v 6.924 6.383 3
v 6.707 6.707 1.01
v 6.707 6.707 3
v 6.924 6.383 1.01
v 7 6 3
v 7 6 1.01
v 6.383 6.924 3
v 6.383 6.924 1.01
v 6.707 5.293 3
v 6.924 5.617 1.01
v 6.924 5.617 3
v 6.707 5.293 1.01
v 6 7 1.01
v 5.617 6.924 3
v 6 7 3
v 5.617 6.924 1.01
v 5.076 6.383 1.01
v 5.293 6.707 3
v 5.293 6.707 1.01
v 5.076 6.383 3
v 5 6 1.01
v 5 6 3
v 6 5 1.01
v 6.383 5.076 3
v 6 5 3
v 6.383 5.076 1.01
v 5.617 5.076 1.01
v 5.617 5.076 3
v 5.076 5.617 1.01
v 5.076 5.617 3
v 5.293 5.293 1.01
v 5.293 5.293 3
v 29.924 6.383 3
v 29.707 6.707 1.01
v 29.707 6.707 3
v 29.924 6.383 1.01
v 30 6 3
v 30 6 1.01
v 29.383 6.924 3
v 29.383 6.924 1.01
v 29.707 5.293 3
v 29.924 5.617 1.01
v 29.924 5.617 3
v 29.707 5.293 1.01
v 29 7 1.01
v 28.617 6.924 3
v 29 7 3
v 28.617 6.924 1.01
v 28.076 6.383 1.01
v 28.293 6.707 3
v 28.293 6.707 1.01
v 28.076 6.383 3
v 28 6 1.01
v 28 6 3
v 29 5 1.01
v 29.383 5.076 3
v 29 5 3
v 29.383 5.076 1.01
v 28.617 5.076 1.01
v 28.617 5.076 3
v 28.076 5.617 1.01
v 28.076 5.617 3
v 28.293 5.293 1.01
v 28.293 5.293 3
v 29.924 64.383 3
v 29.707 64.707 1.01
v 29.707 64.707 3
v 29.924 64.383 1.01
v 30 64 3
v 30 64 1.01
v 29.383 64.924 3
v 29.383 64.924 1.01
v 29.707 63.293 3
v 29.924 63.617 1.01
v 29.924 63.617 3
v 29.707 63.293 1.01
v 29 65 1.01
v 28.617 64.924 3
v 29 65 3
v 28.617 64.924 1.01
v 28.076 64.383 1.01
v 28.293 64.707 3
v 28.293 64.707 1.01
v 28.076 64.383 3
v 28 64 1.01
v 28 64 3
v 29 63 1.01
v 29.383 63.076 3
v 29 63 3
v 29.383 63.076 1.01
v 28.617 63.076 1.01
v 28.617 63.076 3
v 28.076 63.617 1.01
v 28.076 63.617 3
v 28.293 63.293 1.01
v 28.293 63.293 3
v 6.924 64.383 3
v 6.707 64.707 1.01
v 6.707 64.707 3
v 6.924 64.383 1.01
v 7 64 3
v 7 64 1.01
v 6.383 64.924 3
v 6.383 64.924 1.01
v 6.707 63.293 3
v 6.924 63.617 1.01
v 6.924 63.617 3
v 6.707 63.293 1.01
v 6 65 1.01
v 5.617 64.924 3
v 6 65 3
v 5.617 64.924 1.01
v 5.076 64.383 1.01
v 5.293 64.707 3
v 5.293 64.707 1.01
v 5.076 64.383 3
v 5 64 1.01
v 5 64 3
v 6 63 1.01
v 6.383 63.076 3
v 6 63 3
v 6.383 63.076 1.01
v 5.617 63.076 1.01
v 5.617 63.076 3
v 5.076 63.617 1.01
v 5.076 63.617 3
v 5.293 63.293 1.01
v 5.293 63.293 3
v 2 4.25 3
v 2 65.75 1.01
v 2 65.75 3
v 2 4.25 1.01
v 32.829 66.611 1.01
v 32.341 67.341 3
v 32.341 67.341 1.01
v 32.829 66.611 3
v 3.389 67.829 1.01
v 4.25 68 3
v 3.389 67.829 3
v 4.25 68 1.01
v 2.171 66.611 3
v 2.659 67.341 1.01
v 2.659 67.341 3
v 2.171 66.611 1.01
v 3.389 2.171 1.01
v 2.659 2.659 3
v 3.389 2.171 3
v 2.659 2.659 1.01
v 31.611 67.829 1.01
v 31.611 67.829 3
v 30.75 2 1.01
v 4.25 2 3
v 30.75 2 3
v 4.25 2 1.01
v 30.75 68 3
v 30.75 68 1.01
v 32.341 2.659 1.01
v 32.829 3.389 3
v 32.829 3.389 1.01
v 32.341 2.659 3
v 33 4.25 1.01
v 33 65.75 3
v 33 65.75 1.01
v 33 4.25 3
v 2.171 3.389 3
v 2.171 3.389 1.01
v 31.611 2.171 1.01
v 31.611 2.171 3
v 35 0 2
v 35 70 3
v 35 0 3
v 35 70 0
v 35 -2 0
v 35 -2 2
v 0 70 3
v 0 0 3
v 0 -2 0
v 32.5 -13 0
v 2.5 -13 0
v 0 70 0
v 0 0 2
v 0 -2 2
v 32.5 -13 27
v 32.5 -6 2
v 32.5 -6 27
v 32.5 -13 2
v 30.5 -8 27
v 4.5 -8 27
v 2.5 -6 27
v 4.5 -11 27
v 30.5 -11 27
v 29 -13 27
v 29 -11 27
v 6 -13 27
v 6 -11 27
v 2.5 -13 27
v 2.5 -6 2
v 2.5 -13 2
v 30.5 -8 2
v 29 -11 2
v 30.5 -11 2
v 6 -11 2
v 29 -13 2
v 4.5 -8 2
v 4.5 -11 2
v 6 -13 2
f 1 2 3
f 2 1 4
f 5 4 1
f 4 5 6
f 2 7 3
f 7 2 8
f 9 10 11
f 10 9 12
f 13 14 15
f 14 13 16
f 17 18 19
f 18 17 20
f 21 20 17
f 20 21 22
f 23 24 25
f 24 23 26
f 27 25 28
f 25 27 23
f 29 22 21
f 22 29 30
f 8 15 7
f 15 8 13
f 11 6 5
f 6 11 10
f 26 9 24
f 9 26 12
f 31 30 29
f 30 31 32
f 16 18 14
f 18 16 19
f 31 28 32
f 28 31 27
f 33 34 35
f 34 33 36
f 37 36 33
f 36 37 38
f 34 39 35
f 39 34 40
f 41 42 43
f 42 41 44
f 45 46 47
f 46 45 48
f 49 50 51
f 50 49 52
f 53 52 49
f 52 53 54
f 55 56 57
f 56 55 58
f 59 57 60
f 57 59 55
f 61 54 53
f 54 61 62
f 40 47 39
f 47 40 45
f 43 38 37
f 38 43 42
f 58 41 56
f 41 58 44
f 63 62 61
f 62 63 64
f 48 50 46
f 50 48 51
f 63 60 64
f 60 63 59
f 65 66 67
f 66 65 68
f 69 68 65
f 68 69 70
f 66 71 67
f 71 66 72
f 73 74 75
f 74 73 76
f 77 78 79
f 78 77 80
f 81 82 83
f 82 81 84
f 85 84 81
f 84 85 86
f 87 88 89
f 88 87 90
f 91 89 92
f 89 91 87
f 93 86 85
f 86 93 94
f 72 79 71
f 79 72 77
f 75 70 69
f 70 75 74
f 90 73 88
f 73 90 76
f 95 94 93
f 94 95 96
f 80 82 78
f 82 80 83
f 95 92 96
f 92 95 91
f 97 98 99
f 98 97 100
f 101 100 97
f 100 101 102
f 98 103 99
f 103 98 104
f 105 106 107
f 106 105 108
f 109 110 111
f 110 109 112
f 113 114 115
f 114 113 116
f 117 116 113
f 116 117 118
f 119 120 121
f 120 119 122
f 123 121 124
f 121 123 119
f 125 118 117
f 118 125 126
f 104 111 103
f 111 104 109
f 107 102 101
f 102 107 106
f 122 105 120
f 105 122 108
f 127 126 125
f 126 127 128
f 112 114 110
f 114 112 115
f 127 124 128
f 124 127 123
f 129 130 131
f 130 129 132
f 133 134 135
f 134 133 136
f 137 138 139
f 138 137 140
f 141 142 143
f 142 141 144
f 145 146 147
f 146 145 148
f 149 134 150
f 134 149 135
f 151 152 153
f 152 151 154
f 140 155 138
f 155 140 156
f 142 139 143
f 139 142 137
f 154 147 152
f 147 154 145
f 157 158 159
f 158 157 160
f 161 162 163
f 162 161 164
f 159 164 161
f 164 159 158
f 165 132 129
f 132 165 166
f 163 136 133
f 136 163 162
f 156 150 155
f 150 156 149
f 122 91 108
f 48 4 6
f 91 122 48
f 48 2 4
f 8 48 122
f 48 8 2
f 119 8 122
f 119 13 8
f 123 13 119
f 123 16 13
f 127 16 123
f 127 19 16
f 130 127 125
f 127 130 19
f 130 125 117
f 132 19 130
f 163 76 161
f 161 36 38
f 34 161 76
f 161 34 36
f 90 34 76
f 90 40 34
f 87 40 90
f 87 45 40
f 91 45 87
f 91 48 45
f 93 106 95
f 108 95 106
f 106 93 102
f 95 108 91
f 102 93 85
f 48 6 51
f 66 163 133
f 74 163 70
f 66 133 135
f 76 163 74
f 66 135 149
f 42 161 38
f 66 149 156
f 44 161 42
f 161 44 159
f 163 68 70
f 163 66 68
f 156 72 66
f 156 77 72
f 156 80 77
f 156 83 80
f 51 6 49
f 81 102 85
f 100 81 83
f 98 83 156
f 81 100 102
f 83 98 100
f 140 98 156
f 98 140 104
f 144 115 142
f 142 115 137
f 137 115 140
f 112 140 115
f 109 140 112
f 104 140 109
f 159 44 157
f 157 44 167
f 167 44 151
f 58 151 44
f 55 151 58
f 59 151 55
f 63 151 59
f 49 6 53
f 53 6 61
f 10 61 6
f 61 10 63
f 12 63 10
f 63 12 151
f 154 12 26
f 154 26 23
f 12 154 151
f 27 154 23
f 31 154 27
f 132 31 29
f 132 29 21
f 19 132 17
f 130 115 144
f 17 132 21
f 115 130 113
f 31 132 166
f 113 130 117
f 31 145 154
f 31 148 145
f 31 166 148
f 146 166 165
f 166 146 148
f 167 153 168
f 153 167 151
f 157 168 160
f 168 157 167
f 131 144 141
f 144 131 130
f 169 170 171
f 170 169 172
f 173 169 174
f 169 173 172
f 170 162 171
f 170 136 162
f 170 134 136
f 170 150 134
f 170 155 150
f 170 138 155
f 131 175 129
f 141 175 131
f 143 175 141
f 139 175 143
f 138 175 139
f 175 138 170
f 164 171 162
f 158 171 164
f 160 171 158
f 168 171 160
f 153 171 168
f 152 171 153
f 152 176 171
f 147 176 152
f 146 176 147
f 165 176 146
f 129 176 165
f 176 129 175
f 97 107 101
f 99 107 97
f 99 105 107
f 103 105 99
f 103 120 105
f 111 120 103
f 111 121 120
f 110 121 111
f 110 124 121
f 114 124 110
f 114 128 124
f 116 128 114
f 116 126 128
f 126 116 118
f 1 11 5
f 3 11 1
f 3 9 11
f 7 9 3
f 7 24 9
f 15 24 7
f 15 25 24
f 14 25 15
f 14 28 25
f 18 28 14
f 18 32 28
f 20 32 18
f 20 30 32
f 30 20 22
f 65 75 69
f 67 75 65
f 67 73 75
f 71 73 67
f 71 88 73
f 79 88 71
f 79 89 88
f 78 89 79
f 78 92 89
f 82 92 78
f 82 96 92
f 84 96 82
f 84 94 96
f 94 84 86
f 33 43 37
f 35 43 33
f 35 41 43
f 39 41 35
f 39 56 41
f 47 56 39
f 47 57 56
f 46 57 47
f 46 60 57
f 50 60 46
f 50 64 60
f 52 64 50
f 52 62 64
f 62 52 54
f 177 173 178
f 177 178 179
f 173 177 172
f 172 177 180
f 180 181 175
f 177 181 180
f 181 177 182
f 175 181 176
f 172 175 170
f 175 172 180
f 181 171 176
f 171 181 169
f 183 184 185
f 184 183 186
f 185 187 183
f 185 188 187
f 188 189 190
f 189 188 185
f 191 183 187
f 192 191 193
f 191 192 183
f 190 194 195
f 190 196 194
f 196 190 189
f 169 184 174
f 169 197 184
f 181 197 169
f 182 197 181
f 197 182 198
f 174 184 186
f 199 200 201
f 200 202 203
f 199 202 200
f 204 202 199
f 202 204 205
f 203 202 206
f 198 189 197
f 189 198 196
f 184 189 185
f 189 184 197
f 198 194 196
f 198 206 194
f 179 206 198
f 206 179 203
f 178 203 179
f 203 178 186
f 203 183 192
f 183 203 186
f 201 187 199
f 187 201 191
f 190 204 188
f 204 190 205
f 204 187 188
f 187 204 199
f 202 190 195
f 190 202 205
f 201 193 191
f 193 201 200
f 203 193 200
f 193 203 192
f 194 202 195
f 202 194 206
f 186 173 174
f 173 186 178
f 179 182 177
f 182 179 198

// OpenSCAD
    
//cylinder(d=2.5, h=5, $fn=16);


module PiZero()
{
    w=65;
    h=30;
    t=2;

    d=3.5;
    dd=2;
    hd=3.5;

    difference() {
        hull()
            for (i = [[d/2,d/2,0], [h-d/2,d/2,0], [h-d/2,w-d/2,0], [d/2,w-d/2,0]])
                translate(i)
                    cylinder(d=d+1, h=t, $fn=16);
        for (i = [[hd,hd,-t/2], [h-hd,hd,-t/2], [h-hd,w-hd,-t/2], [hd,w-hd,-t/2]])
            translate(i)
                cylinder(d=dd, h=t*2, $fn=16);
    }
}

union() {
    difference() {
        translate([0,0,0])
            cube([30+5,65+5,3]);

        translate([2.5,2.5,1.01])
            PiZero();
    }


    translate([0,0,2])
        difference() {
            translate([2.5,-13,0])
                cube([30,7,25]);
            translate([4.5,-11,-0.005])
                cube([26,3,25.01]);
            translate([6,-13.01,-0.005])
                cube([23,3,25.01]);
        }

    hull() {
        translate([2.5,-13,0])
            cube([30,7,2]);

        translate([0,-2,0])
            cube([30+5,2,2]);
    }
}
